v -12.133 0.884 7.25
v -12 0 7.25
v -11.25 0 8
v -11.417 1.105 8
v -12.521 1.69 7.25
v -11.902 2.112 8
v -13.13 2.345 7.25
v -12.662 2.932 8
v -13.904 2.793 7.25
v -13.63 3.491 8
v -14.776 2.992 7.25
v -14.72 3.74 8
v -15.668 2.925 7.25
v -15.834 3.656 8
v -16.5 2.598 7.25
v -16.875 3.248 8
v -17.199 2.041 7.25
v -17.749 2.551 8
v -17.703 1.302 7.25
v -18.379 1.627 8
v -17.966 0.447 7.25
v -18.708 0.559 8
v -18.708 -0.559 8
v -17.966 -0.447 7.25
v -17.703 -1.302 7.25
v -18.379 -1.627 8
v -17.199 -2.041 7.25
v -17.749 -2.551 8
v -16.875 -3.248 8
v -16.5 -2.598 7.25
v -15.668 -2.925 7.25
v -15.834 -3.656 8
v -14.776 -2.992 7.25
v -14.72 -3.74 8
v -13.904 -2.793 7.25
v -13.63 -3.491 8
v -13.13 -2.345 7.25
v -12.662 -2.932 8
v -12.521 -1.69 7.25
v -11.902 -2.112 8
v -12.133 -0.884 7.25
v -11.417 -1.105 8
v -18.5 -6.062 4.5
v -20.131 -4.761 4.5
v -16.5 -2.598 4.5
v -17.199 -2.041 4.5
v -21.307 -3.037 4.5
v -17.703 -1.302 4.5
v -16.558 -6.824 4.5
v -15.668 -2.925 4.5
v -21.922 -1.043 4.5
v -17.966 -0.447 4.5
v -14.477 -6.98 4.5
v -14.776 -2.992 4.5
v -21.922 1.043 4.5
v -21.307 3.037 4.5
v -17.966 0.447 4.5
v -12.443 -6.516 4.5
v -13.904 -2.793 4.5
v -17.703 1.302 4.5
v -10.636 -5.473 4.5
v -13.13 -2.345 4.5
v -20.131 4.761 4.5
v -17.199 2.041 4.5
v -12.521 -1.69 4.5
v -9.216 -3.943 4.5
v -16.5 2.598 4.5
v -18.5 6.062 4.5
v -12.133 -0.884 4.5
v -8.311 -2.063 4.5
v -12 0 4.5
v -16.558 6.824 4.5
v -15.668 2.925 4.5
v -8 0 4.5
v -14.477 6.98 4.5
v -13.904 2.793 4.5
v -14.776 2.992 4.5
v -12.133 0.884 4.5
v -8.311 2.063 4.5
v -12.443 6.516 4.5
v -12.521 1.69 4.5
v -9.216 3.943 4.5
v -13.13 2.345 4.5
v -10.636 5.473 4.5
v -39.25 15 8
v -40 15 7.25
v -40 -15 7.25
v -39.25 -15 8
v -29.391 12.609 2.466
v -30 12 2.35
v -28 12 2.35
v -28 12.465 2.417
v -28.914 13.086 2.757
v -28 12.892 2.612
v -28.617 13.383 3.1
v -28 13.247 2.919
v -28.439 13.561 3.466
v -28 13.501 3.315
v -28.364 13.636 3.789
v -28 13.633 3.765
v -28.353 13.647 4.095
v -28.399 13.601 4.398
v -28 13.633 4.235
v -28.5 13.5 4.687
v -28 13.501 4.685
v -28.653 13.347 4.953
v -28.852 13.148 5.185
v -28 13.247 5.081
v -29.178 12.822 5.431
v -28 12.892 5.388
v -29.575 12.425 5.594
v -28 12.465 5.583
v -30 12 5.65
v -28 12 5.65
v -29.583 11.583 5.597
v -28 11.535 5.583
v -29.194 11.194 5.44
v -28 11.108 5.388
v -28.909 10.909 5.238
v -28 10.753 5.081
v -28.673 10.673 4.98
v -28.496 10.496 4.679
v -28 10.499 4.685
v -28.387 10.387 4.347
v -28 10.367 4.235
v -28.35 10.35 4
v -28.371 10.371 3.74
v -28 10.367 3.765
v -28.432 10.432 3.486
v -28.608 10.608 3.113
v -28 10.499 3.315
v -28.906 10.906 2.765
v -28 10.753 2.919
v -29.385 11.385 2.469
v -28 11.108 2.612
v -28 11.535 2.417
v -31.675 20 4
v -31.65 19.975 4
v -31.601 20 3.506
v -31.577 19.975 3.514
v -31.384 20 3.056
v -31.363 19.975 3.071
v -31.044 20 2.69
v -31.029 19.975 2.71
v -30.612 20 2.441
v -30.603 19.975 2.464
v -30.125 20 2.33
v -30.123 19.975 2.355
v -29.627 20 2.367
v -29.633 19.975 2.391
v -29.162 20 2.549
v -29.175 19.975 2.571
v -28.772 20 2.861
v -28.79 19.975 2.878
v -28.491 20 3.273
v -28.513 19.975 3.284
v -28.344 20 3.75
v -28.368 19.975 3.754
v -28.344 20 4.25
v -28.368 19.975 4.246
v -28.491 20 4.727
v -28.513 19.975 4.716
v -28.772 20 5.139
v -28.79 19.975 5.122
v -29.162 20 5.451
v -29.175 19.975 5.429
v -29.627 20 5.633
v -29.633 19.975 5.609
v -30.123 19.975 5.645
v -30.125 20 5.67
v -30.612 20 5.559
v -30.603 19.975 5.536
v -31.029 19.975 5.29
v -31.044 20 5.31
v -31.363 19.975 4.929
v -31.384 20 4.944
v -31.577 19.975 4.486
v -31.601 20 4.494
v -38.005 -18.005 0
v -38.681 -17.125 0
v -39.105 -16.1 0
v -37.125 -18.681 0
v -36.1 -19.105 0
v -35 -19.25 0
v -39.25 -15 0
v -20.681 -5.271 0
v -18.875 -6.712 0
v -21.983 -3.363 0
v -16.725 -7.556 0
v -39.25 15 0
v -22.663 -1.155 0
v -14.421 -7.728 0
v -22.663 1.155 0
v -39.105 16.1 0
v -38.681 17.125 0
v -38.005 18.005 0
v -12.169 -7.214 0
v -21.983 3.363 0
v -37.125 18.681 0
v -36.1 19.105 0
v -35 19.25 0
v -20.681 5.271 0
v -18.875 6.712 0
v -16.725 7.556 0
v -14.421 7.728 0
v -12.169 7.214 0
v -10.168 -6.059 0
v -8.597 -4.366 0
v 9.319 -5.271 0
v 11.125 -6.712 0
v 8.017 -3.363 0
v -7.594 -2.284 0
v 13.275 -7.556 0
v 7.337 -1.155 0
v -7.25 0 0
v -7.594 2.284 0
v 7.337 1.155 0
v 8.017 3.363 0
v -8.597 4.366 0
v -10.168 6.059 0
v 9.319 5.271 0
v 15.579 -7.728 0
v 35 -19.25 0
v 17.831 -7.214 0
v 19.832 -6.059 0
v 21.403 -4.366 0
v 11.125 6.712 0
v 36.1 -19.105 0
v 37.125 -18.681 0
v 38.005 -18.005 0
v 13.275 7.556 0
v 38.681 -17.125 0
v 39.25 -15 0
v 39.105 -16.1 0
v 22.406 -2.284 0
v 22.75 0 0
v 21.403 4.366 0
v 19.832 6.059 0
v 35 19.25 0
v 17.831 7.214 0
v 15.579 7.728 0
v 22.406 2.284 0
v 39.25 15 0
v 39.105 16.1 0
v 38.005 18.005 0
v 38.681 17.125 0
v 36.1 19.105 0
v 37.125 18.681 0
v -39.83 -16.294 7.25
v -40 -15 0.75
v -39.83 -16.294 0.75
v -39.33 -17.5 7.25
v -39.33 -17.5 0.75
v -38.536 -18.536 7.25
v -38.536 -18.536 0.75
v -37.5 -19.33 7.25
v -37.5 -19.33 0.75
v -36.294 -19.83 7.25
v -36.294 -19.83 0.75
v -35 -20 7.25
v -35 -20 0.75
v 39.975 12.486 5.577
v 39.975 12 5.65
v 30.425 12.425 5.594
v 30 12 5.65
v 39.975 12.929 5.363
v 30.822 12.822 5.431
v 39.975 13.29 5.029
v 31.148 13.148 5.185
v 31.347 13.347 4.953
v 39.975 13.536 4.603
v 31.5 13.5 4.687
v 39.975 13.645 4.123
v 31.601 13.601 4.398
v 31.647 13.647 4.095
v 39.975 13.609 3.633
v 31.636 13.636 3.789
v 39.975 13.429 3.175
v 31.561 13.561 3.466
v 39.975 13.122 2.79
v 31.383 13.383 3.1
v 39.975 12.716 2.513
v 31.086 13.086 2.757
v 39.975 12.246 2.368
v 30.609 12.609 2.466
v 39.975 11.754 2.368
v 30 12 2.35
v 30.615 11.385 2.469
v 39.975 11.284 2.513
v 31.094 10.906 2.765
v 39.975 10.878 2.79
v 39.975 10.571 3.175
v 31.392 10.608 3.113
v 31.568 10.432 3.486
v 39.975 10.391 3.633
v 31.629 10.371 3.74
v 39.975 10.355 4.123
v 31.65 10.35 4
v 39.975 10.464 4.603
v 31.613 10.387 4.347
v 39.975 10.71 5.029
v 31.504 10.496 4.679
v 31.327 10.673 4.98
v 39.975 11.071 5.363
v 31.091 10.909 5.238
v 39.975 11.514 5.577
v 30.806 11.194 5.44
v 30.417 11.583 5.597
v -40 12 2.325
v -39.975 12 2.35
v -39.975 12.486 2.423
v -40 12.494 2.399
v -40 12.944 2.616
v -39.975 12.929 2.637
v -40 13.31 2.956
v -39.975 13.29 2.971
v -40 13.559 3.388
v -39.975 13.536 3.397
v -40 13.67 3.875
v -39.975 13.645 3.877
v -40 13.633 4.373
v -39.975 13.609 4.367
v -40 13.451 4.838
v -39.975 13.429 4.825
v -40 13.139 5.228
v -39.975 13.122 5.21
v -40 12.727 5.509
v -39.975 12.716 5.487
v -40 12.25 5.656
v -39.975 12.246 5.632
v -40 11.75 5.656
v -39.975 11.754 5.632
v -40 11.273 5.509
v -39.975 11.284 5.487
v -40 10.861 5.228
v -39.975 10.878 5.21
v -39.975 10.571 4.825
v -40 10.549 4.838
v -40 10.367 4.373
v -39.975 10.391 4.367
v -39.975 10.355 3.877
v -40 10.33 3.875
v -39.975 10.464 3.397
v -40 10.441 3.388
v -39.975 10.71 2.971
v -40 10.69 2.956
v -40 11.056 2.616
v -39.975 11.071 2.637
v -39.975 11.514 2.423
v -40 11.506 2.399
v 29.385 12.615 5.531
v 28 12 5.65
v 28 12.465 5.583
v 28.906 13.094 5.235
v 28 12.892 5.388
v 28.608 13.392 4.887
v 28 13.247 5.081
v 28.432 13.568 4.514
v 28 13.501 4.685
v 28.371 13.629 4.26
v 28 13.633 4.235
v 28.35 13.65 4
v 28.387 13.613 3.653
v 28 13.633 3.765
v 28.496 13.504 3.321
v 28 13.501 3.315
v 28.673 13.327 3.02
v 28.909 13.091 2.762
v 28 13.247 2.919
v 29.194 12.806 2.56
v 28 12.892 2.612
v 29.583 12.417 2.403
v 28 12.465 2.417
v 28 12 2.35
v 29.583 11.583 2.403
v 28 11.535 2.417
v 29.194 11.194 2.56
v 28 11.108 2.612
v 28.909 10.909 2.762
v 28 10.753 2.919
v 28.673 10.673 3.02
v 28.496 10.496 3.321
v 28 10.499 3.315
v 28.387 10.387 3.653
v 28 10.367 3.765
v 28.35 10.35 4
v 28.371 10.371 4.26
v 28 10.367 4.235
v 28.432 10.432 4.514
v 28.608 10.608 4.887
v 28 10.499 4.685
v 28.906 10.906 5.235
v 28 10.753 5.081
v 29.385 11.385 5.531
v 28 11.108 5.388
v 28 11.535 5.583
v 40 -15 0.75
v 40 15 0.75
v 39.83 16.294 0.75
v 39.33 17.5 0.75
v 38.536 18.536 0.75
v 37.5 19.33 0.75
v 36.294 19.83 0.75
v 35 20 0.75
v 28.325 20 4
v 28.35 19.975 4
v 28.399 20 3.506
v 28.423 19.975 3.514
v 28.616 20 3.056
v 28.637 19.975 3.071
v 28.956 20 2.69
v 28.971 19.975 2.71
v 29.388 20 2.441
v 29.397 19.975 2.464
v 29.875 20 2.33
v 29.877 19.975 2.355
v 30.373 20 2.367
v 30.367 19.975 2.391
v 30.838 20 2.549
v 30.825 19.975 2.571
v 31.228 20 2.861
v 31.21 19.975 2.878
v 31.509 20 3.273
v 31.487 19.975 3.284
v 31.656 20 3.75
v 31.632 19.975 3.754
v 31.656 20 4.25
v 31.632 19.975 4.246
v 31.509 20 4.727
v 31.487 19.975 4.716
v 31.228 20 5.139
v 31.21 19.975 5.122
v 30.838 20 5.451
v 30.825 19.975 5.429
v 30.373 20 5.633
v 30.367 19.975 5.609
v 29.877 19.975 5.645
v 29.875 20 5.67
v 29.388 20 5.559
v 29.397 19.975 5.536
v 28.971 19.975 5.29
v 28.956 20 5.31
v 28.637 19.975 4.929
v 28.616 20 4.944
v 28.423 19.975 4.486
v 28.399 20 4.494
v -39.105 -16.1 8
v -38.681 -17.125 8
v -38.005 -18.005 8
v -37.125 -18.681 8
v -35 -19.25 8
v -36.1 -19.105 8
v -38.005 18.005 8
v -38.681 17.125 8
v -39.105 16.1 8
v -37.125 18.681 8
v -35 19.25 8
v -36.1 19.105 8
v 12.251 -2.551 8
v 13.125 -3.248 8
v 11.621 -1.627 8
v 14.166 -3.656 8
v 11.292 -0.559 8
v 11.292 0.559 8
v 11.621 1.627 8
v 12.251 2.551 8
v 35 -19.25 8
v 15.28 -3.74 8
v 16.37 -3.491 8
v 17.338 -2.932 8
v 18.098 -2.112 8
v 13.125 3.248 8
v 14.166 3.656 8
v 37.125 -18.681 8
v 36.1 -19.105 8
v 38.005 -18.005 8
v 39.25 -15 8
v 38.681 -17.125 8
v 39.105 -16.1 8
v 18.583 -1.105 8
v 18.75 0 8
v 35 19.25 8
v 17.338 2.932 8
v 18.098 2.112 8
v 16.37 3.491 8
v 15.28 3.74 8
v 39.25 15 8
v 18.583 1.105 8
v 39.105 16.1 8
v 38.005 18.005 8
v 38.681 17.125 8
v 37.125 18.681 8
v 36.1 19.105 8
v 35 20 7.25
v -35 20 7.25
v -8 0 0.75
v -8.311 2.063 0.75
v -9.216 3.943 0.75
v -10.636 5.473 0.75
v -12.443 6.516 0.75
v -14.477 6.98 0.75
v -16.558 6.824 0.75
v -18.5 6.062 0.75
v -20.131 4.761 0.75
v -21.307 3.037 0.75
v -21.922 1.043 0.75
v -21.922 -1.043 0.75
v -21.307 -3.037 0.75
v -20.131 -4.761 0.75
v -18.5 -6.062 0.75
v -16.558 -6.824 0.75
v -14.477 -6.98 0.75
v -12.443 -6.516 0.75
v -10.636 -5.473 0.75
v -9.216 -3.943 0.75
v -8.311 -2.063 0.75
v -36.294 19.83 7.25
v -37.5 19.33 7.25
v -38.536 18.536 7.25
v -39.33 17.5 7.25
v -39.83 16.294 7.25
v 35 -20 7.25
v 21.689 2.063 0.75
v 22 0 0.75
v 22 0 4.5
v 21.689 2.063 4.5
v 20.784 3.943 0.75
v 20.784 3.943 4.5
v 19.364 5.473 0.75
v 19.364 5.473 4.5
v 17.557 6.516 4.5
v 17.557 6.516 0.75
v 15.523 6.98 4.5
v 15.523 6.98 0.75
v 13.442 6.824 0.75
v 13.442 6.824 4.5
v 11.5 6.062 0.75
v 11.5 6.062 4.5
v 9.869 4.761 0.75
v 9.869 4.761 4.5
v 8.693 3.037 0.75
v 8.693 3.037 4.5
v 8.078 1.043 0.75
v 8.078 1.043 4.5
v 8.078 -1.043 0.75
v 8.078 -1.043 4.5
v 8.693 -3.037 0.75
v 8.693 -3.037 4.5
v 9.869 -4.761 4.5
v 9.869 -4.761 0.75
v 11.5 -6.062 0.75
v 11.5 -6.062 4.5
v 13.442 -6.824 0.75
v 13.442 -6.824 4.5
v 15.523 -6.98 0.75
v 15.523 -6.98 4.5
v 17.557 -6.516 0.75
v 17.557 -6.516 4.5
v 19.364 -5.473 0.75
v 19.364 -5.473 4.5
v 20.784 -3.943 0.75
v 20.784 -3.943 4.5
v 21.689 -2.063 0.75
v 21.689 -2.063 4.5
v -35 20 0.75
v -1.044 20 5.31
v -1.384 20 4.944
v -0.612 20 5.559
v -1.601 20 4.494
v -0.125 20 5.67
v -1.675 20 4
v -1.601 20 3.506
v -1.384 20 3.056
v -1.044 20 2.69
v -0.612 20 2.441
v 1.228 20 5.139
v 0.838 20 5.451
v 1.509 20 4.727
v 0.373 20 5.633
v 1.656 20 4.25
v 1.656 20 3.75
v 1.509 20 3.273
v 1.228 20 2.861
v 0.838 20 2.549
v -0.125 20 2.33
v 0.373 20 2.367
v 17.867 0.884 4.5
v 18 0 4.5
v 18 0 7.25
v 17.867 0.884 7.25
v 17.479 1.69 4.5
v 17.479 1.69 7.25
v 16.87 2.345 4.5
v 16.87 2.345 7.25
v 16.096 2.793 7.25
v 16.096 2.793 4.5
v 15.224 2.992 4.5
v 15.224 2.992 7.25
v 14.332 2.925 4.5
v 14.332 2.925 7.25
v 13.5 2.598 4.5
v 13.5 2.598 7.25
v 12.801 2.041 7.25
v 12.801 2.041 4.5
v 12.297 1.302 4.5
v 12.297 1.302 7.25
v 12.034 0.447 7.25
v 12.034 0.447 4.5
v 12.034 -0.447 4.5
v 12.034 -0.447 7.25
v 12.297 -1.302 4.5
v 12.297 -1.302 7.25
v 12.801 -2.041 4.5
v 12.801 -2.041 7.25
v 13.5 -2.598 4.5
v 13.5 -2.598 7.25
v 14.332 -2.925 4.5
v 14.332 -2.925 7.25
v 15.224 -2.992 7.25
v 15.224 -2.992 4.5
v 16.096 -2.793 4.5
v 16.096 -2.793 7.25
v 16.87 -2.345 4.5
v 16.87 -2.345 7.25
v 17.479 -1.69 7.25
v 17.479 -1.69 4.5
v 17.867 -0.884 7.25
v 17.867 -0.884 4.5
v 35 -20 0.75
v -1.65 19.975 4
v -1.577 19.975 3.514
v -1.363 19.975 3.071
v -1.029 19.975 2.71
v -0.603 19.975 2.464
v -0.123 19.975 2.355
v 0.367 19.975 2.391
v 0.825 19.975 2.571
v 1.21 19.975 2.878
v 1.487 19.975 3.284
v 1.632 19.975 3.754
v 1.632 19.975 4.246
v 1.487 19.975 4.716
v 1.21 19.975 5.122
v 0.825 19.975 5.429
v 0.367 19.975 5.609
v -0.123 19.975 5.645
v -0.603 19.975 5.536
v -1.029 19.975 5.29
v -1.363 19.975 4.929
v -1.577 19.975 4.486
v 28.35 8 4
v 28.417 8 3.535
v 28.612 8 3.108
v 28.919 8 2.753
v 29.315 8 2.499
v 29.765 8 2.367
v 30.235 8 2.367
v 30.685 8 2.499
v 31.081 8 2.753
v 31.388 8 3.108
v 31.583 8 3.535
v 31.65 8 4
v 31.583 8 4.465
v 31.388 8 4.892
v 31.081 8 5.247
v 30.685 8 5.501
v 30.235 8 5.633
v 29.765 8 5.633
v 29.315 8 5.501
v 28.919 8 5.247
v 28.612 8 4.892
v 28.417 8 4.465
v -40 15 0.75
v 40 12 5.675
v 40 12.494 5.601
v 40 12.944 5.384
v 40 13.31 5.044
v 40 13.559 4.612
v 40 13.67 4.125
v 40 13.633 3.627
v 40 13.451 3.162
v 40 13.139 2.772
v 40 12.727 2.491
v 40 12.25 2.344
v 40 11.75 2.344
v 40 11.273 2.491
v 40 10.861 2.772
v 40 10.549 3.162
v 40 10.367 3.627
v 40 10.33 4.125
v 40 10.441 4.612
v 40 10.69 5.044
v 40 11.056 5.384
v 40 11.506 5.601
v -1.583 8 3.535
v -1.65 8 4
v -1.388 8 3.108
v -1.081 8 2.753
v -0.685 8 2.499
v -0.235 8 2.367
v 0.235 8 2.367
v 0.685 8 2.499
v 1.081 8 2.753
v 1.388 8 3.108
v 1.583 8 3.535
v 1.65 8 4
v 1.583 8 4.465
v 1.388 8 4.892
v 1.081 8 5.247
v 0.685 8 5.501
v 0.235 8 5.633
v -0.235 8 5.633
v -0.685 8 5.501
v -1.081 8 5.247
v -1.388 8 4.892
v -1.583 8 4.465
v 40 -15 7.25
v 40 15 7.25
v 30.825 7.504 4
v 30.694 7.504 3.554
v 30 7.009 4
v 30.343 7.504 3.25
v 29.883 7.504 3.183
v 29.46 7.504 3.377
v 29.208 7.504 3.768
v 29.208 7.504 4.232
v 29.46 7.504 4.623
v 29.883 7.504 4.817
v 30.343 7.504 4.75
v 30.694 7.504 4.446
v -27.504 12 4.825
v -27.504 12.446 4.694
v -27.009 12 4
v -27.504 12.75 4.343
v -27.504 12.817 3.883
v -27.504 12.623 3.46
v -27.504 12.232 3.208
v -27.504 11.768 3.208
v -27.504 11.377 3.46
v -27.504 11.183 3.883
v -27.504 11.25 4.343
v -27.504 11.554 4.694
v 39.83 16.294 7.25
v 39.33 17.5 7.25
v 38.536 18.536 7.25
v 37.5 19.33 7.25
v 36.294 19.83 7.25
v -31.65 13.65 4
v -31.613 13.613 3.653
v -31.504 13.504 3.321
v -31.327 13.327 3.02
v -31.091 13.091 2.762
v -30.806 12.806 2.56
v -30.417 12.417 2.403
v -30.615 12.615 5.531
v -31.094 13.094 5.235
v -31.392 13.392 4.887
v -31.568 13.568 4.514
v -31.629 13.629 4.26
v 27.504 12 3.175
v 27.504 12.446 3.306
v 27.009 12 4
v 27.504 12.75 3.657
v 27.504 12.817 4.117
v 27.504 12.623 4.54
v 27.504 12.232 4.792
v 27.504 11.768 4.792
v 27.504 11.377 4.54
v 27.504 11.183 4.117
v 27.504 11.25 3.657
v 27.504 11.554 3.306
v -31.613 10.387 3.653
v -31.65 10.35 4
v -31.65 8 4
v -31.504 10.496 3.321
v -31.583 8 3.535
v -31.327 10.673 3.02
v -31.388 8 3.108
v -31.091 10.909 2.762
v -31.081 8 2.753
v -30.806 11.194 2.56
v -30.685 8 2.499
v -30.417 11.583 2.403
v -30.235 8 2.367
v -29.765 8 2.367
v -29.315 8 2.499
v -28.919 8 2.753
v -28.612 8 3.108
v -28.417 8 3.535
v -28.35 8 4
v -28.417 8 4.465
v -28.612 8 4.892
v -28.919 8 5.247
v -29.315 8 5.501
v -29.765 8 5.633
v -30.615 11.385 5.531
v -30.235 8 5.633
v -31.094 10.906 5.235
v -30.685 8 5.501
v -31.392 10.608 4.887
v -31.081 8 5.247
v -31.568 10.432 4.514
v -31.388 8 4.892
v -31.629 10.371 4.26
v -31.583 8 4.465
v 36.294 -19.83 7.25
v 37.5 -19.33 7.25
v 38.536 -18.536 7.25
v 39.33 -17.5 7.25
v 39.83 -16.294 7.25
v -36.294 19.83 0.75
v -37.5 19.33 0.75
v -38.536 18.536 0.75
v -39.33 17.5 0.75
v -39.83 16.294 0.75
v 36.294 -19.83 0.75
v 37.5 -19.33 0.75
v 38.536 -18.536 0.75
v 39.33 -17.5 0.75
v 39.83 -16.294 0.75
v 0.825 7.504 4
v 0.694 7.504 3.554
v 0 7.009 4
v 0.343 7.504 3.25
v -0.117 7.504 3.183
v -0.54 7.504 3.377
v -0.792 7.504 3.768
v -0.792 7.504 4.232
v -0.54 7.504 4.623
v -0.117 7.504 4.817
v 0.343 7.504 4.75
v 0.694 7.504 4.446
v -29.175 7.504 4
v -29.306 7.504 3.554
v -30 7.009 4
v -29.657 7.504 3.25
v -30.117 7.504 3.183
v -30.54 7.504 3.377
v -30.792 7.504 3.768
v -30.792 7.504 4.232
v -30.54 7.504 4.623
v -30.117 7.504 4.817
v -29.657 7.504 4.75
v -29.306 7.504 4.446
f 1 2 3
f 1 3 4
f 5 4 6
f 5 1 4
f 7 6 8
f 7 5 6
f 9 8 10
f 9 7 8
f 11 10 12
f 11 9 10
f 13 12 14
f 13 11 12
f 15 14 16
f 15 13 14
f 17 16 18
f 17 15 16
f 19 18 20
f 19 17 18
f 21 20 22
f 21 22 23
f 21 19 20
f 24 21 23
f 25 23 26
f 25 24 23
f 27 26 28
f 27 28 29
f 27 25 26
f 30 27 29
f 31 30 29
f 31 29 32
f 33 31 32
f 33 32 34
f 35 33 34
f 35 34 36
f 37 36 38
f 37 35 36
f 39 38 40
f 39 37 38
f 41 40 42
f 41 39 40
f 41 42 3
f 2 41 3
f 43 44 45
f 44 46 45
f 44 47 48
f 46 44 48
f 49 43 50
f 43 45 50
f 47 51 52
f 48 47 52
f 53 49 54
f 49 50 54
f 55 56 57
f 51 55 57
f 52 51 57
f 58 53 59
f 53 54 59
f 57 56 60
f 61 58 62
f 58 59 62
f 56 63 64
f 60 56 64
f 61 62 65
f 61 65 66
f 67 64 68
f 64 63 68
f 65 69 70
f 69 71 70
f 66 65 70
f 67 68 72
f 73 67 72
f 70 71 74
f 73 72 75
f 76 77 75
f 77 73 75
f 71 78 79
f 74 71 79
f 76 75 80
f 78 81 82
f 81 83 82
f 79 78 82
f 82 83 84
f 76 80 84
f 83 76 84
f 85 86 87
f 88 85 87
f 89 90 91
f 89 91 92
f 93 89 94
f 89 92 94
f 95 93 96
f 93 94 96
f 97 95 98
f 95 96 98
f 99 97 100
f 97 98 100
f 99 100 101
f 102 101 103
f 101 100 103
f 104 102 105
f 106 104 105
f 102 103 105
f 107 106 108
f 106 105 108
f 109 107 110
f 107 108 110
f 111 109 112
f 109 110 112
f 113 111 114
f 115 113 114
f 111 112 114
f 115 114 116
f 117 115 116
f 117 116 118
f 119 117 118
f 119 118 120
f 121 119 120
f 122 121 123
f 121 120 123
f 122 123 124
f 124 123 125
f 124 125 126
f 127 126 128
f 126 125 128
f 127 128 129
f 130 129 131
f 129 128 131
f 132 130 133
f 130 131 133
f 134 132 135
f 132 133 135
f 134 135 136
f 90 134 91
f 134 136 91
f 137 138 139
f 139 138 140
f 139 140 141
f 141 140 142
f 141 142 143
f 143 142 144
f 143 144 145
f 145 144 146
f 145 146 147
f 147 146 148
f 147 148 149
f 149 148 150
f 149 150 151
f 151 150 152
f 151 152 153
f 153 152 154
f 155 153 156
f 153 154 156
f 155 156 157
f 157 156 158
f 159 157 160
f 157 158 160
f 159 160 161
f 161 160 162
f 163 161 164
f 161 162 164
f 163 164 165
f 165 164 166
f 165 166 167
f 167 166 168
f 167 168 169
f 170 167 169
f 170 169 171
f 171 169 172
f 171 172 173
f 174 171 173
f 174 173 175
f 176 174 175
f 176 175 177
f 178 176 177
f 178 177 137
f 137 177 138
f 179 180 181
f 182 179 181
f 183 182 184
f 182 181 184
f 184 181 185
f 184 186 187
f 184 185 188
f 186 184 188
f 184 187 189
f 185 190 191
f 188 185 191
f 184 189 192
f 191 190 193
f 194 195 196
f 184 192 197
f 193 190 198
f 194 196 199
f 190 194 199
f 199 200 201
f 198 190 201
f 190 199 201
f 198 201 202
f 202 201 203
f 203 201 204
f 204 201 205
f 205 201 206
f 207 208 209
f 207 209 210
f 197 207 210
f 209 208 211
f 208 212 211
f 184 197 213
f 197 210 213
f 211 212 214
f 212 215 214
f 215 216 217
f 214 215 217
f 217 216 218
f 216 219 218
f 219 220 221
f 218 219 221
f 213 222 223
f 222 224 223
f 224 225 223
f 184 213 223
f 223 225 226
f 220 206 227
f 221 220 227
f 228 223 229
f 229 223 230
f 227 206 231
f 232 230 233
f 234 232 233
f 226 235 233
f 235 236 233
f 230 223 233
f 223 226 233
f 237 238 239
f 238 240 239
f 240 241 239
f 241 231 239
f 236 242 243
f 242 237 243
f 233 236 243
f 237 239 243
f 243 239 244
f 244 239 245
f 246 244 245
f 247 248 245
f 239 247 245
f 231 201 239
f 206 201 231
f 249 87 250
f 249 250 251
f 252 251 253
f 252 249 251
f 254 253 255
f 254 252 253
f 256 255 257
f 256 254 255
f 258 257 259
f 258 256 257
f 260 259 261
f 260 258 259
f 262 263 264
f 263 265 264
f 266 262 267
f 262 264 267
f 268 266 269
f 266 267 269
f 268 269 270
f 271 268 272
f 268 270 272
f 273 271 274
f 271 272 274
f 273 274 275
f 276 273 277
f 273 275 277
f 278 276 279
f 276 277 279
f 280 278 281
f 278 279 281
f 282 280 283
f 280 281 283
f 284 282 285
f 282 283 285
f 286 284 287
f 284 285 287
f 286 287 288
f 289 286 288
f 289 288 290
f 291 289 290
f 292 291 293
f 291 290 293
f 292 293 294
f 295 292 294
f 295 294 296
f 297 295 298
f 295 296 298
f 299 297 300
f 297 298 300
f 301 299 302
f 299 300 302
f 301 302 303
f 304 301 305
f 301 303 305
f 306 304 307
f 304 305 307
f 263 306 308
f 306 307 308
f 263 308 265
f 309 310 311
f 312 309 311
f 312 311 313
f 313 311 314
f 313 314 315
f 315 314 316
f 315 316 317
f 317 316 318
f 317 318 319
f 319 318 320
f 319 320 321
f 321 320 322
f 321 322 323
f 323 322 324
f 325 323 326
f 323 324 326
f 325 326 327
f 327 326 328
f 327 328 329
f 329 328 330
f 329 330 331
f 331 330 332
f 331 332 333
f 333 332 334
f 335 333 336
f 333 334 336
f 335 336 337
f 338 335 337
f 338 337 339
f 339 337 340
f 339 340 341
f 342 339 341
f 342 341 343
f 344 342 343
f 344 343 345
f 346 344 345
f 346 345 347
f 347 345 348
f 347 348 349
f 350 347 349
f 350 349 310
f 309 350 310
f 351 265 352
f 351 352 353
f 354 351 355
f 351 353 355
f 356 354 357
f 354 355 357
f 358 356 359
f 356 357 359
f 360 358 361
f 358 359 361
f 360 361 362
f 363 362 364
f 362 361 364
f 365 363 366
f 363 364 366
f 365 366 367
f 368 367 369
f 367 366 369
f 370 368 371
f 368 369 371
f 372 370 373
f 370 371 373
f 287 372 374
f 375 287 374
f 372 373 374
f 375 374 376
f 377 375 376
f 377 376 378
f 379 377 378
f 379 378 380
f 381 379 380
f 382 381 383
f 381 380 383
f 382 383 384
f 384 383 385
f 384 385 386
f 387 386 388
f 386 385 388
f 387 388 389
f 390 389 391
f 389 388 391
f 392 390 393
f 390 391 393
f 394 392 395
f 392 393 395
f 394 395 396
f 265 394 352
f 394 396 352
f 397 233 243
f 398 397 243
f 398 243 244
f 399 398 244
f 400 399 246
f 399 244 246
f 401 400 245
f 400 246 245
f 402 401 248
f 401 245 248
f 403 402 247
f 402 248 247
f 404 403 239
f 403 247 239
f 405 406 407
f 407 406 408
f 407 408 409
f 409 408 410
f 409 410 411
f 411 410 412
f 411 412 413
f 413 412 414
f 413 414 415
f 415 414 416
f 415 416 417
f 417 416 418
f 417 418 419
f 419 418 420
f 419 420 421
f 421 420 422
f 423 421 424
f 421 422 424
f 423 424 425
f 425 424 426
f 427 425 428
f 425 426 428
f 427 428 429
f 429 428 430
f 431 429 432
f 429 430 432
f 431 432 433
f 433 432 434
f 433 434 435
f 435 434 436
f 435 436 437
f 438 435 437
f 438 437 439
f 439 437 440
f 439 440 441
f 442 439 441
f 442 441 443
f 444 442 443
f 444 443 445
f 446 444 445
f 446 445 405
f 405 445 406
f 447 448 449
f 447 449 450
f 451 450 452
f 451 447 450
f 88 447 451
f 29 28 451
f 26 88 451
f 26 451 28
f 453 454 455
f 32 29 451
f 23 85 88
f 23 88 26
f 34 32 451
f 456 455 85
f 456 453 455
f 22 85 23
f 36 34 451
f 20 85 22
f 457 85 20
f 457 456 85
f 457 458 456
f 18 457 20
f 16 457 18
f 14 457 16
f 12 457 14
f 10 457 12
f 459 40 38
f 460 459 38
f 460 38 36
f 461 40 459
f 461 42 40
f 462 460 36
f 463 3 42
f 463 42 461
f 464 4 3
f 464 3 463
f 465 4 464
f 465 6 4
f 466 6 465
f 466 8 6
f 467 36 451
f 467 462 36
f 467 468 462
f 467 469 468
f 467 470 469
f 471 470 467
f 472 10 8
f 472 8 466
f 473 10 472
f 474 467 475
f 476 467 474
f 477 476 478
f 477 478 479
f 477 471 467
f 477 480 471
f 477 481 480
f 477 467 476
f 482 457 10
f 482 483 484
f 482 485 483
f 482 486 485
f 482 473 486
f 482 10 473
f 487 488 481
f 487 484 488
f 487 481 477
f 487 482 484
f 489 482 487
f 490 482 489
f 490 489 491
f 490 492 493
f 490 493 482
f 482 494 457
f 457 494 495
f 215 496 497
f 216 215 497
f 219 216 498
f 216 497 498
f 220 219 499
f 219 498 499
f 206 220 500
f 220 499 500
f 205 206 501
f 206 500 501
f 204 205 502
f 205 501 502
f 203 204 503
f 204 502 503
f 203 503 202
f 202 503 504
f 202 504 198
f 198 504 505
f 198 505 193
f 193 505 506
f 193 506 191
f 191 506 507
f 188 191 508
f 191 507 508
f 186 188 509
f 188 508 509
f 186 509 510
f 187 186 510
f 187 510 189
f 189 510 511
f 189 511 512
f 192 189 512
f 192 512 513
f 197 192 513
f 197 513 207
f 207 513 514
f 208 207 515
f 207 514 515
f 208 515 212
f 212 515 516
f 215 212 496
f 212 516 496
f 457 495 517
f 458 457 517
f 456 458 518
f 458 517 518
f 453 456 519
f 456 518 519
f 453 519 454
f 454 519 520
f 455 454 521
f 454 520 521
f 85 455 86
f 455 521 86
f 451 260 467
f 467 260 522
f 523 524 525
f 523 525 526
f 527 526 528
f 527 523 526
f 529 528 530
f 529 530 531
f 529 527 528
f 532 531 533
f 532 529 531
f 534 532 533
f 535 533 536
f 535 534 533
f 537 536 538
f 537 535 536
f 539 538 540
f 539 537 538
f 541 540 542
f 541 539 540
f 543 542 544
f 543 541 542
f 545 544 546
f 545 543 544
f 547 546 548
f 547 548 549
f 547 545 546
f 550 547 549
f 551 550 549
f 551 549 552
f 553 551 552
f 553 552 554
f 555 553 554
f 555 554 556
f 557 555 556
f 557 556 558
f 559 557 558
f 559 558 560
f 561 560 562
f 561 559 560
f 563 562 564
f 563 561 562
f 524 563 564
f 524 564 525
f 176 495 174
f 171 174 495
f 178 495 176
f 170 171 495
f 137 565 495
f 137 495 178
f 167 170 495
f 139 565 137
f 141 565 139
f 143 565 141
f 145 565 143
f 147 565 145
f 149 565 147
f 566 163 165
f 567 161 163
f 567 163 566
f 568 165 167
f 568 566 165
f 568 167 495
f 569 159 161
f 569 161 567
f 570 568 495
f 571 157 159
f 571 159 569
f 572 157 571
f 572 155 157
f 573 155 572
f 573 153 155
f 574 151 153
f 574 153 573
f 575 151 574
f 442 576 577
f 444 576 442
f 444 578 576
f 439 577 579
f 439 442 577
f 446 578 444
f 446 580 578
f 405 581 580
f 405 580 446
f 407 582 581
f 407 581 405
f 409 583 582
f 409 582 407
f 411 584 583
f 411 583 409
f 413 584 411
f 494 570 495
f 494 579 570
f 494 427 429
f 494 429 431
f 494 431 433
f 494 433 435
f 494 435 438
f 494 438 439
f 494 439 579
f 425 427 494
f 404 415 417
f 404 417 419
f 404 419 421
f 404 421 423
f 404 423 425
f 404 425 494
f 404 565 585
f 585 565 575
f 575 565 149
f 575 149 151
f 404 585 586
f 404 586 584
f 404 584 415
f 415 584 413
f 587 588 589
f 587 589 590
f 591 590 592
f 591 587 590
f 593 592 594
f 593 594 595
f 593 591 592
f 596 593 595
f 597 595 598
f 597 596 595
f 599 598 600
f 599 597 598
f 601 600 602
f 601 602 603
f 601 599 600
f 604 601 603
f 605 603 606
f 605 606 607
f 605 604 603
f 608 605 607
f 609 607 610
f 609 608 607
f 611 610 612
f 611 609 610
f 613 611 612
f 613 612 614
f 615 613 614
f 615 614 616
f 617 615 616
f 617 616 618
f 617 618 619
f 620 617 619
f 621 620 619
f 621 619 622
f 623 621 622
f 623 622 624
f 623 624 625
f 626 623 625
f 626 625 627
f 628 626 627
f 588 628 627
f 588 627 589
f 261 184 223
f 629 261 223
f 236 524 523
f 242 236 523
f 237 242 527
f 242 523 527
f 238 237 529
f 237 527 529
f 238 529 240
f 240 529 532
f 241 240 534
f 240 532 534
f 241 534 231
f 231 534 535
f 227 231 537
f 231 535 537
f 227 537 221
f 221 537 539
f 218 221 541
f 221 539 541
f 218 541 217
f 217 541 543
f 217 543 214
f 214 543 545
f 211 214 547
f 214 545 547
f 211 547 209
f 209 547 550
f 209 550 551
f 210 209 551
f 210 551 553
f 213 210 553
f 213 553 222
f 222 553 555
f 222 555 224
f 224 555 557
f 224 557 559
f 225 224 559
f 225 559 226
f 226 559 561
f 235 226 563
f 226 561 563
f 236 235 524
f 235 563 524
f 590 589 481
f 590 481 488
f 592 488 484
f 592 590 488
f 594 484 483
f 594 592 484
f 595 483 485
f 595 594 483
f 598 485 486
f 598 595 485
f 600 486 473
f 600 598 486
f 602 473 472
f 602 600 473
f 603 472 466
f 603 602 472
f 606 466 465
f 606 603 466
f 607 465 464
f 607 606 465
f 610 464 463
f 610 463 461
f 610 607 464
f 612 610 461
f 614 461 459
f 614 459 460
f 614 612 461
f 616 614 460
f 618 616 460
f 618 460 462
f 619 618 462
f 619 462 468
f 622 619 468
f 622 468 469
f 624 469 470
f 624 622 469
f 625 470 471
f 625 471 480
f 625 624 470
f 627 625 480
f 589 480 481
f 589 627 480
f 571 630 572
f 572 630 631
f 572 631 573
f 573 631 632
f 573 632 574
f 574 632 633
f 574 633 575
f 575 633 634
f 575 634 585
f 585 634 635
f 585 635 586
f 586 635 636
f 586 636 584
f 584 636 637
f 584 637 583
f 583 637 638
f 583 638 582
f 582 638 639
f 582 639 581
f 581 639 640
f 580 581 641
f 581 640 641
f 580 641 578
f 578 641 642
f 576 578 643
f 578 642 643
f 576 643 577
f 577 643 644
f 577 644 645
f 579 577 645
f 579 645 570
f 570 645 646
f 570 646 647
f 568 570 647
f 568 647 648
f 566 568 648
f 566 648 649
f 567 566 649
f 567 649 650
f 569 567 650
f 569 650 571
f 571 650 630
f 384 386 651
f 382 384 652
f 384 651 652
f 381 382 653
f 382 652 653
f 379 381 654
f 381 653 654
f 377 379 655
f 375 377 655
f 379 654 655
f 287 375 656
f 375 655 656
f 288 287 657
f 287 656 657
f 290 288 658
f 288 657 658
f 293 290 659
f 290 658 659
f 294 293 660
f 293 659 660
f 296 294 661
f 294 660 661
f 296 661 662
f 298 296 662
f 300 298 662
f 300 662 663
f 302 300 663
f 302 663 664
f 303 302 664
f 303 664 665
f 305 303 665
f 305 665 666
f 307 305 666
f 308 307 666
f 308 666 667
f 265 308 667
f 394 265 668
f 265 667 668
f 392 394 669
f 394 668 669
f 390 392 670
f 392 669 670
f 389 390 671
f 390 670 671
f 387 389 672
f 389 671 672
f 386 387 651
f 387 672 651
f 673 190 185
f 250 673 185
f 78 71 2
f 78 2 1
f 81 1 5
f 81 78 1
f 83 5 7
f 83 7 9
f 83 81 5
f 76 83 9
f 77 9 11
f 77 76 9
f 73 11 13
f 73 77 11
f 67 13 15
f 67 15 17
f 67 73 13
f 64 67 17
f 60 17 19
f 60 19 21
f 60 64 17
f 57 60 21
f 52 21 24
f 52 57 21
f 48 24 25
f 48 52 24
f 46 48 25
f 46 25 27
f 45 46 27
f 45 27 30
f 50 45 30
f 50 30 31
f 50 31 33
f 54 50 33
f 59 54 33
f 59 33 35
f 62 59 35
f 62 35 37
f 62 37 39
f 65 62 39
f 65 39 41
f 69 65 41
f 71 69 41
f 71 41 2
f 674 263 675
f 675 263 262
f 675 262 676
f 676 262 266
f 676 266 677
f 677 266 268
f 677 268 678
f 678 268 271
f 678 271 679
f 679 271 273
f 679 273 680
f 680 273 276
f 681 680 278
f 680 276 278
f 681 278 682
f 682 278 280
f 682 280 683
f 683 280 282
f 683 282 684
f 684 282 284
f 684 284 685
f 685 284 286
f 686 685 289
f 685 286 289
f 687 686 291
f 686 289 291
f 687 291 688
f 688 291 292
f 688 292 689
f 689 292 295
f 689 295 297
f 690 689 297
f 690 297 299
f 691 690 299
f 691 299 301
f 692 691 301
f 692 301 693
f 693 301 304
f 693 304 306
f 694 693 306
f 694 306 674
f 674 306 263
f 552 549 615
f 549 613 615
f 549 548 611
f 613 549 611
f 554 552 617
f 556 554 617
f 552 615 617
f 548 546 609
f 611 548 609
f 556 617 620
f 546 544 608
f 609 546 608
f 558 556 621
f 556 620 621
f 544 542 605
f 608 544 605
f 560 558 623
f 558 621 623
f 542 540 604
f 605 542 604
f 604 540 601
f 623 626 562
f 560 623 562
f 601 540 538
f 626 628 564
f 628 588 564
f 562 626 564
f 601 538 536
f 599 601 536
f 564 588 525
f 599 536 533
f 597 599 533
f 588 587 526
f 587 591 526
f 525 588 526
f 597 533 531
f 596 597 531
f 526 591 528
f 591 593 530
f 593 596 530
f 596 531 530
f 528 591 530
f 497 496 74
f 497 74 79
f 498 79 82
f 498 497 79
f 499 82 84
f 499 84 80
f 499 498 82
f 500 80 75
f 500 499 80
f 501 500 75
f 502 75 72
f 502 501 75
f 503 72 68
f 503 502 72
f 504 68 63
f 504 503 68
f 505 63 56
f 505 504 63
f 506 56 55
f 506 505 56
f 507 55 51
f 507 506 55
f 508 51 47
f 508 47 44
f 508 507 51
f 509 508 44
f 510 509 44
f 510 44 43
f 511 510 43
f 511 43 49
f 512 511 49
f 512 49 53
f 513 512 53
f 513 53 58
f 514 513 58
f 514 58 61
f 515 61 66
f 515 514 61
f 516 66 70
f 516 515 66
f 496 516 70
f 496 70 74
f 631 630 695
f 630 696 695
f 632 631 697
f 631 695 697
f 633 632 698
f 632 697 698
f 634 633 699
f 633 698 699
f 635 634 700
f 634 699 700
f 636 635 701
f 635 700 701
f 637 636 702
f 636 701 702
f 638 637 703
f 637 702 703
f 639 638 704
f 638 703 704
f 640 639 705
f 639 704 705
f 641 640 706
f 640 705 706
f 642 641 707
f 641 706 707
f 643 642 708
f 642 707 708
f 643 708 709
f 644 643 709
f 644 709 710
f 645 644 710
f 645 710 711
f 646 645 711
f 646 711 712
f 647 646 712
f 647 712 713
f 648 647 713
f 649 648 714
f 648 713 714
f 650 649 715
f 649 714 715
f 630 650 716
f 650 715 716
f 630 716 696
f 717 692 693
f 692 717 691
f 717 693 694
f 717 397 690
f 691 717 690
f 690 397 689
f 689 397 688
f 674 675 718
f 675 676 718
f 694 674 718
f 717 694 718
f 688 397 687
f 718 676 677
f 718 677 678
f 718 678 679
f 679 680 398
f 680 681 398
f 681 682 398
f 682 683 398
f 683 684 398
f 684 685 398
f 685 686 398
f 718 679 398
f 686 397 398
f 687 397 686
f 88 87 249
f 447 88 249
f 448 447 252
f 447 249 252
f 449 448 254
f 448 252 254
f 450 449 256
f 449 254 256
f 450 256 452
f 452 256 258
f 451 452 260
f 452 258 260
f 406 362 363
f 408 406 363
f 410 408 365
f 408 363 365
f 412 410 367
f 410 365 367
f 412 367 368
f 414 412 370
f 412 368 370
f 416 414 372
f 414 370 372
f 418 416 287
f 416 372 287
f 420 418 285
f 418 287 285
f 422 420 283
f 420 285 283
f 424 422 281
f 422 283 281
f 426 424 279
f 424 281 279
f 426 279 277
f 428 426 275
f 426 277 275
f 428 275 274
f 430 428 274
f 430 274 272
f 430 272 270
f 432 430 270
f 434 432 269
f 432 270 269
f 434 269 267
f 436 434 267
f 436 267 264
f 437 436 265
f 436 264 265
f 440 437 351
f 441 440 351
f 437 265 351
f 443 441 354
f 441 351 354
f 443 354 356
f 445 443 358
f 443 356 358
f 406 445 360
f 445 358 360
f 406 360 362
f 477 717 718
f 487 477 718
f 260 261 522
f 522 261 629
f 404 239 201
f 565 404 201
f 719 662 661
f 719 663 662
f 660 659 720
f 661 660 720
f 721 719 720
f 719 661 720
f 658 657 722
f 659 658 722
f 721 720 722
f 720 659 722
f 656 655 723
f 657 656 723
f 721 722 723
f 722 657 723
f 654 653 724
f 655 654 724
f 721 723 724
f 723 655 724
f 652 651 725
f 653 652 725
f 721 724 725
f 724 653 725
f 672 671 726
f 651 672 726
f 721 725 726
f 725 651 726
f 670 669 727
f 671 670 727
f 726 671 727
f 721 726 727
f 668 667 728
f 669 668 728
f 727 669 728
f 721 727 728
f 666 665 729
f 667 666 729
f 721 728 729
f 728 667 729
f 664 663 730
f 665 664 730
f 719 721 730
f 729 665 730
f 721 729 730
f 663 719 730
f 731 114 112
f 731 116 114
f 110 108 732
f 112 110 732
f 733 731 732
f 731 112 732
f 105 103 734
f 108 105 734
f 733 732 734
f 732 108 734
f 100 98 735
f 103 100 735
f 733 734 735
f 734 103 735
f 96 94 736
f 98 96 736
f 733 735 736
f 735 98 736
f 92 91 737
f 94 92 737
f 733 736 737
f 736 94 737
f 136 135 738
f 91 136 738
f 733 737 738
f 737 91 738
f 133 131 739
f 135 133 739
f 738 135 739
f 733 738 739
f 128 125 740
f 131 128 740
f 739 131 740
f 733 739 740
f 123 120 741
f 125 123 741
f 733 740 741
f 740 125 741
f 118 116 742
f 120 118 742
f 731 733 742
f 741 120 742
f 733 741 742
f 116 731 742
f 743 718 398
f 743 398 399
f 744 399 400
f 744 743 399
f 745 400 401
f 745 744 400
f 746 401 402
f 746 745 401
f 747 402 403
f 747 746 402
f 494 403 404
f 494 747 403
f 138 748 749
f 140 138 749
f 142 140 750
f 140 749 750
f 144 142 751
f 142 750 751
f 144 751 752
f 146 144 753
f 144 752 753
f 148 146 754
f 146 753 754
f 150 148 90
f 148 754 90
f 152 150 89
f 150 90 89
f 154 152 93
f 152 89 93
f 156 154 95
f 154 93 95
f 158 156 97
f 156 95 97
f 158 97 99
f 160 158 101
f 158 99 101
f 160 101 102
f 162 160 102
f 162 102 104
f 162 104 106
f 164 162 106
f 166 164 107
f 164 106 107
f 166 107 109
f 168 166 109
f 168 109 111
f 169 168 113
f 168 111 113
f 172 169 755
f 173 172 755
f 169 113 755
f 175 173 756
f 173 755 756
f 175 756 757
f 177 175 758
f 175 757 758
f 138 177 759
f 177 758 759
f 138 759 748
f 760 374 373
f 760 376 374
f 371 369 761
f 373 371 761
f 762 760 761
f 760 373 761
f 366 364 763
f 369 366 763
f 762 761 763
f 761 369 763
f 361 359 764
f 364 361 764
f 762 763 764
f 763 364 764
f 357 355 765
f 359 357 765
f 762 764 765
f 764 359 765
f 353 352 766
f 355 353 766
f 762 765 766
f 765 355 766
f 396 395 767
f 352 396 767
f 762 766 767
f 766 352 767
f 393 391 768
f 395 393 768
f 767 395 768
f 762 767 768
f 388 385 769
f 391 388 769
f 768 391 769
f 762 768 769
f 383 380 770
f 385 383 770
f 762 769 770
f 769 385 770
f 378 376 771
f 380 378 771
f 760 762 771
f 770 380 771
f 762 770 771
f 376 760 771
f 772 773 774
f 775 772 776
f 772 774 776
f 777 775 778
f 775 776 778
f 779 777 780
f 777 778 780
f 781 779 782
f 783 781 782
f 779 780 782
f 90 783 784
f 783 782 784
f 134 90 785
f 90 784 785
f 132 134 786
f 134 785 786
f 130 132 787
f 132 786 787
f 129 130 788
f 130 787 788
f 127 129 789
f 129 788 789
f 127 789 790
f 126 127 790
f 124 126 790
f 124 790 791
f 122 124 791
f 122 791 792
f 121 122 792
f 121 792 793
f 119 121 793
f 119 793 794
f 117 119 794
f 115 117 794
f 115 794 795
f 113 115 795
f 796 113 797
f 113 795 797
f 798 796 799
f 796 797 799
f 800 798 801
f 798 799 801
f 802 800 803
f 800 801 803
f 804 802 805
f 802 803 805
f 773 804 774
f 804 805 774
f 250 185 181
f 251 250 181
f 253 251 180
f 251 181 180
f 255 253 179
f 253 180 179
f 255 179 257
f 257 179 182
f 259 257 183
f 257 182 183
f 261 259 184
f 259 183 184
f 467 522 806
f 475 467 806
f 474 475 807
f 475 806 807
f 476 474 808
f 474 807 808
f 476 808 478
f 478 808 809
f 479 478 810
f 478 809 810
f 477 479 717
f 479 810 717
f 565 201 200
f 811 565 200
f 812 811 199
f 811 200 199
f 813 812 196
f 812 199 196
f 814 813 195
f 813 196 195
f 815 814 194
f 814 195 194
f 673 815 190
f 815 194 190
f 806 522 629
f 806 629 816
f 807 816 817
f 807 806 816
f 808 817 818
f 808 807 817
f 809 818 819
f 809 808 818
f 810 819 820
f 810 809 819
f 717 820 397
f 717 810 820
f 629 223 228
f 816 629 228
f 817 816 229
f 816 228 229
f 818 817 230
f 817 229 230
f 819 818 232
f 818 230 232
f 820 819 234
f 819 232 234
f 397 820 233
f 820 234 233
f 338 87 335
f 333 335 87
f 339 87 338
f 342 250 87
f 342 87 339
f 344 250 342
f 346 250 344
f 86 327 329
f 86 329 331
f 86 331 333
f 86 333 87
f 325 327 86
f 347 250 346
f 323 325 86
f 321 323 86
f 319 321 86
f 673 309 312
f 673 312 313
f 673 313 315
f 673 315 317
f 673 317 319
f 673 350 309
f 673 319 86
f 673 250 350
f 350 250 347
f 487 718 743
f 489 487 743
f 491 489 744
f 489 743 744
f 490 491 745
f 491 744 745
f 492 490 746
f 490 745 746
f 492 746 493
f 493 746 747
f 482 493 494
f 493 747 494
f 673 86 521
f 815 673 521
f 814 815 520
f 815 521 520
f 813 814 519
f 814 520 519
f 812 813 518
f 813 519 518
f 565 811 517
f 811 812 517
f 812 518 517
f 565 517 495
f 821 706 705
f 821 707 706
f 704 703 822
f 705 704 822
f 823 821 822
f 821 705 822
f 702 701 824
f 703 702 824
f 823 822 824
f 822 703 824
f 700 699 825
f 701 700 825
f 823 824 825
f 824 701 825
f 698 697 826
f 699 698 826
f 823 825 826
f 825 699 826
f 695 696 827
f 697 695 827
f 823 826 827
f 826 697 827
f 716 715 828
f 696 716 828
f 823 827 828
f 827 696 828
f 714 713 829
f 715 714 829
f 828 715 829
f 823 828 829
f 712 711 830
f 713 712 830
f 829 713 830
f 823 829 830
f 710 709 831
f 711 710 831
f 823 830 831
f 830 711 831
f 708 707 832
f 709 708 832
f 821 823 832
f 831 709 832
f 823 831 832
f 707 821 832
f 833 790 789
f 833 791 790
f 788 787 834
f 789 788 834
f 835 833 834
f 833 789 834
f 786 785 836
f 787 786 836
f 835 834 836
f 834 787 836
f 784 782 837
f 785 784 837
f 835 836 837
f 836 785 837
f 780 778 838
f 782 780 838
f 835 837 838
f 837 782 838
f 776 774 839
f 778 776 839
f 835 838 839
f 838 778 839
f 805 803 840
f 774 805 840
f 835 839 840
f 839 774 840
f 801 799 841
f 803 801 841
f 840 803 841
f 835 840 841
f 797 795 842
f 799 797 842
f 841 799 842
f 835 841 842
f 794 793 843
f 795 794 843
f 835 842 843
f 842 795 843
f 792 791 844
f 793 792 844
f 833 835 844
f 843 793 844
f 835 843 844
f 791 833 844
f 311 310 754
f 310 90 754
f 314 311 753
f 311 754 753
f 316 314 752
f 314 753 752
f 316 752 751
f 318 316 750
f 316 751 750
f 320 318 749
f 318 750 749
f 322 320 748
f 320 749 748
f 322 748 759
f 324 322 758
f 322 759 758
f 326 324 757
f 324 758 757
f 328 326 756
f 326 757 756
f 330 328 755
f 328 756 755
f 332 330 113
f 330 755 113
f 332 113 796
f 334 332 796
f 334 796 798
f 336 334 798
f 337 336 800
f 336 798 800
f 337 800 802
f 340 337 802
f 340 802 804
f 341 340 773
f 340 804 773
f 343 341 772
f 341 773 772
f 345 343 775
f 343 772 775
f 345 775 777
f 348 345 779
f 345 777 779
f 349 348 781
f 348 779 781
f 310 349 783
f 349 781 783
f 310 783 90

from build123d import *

# Parameters (mm, degrees)
SKETCH1_W                             = 80
SKETCH1_H                             = 40
SKETCH1_R                             = 7
SKETCH1_R_2                           = 3
BOSS_EXTRUDE1_DEPTH                   = 8
CUT_EXTRUDE1_OUTLINE_R                = 7
CUT_EXTRUDE1_OUTLINE_R_2              = 3
CUT_EXTRUDE1_DEPTH                    = 4.5
FILLET1_R                             = 5
TAP_DRILL_FOR_M4X0_7_TAP1_D           = 3.3
TAP_DRILL_FOR_M4X0_7_TAP1_DEPTH       = 12
TAP_DRILL_FOR_M4X0_7_TAP1_CSINK_D     = 3.35
TAP_DRILL_FOR_M4X0_7_TAP1_CSINK_ANGLE = 90
TAP_DRILL_FOR_M4X0_7_TAP1_TIP         = 0.991420021
TAP_DRILL_FOR_M4X0_7_TAP2_D           = 3.3
TAP_DRILL_FOR_M4X0_7_TAP2_DEPTH       = 12
TAP_DRILL_FOR_M4X0_7_TAP2_CSINK_D     = 3.35
TAP_DRILL_FOR_M4X0_7_TAP2_CSINK_ANGLE = 90
TAP_DRILL_FOR_M4X0_7_TAP2_TIP         = 0.991420021
TAP_DRILL_FOR_M4X0_7_TAP3_D           = 3.3
TAP_DRILL_FOR_M4X0_7_TAP3_DEPTH       = 12
TAP_DRILL_FOR_M4X0_7_TAP3_CSINK_D     = 3.35
TAP_DRILL_FOR_M4X0_7_TAP3_CSINK_ANGLE = 90
TAP_DRILL_FOR_M4X0_7_TAP3_TIP         = 0.991420021
CHAMFER1_SIZE                         = 0.75


# Read off the part's stored shape, not the designer's step: Cut-Extrude1
with BuildPart() as part:
    # Sketch1 → Boss-Extrude1 (new body)
    # profile 1 of 3: a face of its own
    with BuildSketch(Plane.XY):
        Rectangle(SKETCH1_W, SKETCH1_H)
        with Locations((15, 0)):
            Circle(SKETCH1_R, mode=Mode.SUBTRACT)
        with Locations((-15, 0)):
            Circle(SKETCH1_R, mode=Mode.SUBTRACT)
    # profile 2 of 3: a face of its own
    with BuildSketch(Plane.XY):
        with Locations((-15, 0)):
            Circle(SKETCH1_R)
        with Locations((-15, 0)):
            Circle(SKETCH1_R_2, mode=Mode.SUBTRACT)
    # profile 3 of 3: a face of its own
    with BuildSketch(Plane.XY):
        with Locations((15, 0)):
            Circle(SKETCH1_R)
        with Locations((15, 0)):
            Circle(SKETCH1_R_2, mode=Mode.SUBTRACT)
    extrude(amount=BOSS_EXTRUDE1_DEPTH)

    # Cut-Extrude1 outline → Cut-Extrude1 (cut)
    # profile 1 of 2: a face of its own
    with BuildSketch(Plane.XY):
        with Locations((-15, 0)):
            Circle(CUT_EXTRUDE1_OUTLINE_R)
        with Locations((-15, 0)):
            Circle(CUT_EXTRUDE1_OUTLINE_R_2, mode=Mode.SUBTRACT)
    # profile 2 of 2: a face of its own
    with BuildSketch(Plane.XY):
        with Locations((15, 0)):
            Circle(CUT_EXTRUDE1_OUTLINE_R)
        with Locations((15, 0)):
            Circle(CUT_EXTRUDE1_OUTLINE_R_2, mode=Mode.SUBTRACT)
    extrude(amount=CUT_EXTRUDE1_DEPTH, mode=Mode.SUBTRACT)

    # Fillet1
    fillet1_edges = [part.edges().sort_by_distance(p)[0] for p in [
        (40, -20, 4),
        (-40, -20, 4),
        (-40, 20, 4),
        (40, 20, 4),
    ]]
    fillet(fillet1_edges, radius=FILLET1_R)

    # Tap Drill for M4x0.7 Tap1
    with Locations(Plane(origin=(0, 20, 0), x_dir=(1, 0, 0), z_dir=(0, 1, 0))):
        with Locations((30, -4), (0, -4), (-30, -4)):
            CounterSinkHole(TAP_DRILL_FOR_M4X0_7_TAP1_D / 2, TAP_DRILL_FOR_M4X0_7_TAP1_CSINK_D / 2, depth=TAP_DRILL_FOR_M4X0_7_TAP1_DEPTH, counter_sink_angle=TAP_DRILL_FOR_M4X0_7_TAP1_CSINK_ANGLE)
            with Locations((0, 0, -(TAP_DRILL_FOR_M4X0_7_TAP1_DEPTH + TAP_DRILL_FOR_M4X0_7_TAP1_TIP / 2))):  # 118° drill point
                Cone(0, TAP_DRILL_FOR_M4X0_7_TAP1_D / 2, TAP_DRILL_FOR_M4X0_7_TAP1_TIP, mode=Mode.SUBTRACT)

    # Tap Drill for M4x0.7 Tap2
    with Locations(Plane(origin=(40, 0, 0), x_dir=(0, 0, -1), z_dir=(1, 0, 0))):
        with Locations((-4, 12)):
            CounterSinkHole(TAP_DRILL_FOR_M4X0_7_TAP2_D / 2, TAP_DRILL_FOR_M4X0_7_TAP2_CSINK_D / 2, depth=TAP_DRILL_FOR_M4X0_7_TAP2_DEPTH, counter_sink_angle=TAP_DRILL_FOR_M4X0_7_TAP2_CSINK_ANGLE)
            with Locations((0, 0, -(TAP_DRILL_FOR_M4X0_7_TAP2_DEPTH + TAP_DRILL_FOR_M4X0_7_TAP2_TIP / 2))):  # 118° drill point
                Cone(0, TAP_DRILL_FOR_M4X0_7_TAP2_D / 2, TAP_DRILL_FOR_M4X0_7_TAP2_TIP, mode=Mode.SUBTRACT)

    # Tap Drill for M4x0.7 Tap3
    with Locations(Plane.ZY.offset(40)):
        with Locations((4, 12)):
            CounterSinkHole(TAP_DRILL_FOR_M4X0_7_TAP3_D / 2, TAP_DRILL_FOR_M4X0_7_TAP3_CSINK_D / 2, depth=TAP_DRILL_FOR_M4X0_7_TAP3_DEPTH, counter_sink_angle=TAP_DRILL_FOR_M4X0_7_TAP3_CSINK_ANGLE)
            with Locations((0, 0, -(TAP_DRILL_FOR_M4X0_7_TAP3_DEPTH + TAP_DRILL_FOR_M4X0_7_TAP3_TIP / 2))):  # 118° drill point
                Cone(0, TAP_DRILL_FOR_M4X0_7_TAP3_D / 2, TAP_DRILL_FOR_M4X0_7_TAP3_TIP, mode=Mode.SUBTRACT)

    # Chamfer1
    chamfer1_edges = [part.edges().sort_by_distance(p)[0] for p in [
        (8, 0, 0),
        (-18, 0, 8),
        (-22, 0, 0),
        (12, 0, 8),
        (40, 0, 0),
        (40, 0, 8),
        (0, -20, 0),
        (-40, 0, 0),
        (0, 20, 0),
        (38.535533906, 18.535533906, 0),
        (-38.535533906, 18.535533906, 0),
        (-38.535533906, -18.535533906, 0),
        (38.535533906, -18.535533906, 0),
        (0, -20, 8),
        (0, 20, 8),
        (-40, 0, 8),
        (38.535533906, 18.535533906, 8),
        (-38.535533906, 18.535533906, 8),
        (-38.535533906, -18.535533906, 8),
        (38.535533906, -18.535533906, 8),
    ]]
    chamfer(chamfer1_edges, length=CHAMFER1_SIZE)


solid = part.part
